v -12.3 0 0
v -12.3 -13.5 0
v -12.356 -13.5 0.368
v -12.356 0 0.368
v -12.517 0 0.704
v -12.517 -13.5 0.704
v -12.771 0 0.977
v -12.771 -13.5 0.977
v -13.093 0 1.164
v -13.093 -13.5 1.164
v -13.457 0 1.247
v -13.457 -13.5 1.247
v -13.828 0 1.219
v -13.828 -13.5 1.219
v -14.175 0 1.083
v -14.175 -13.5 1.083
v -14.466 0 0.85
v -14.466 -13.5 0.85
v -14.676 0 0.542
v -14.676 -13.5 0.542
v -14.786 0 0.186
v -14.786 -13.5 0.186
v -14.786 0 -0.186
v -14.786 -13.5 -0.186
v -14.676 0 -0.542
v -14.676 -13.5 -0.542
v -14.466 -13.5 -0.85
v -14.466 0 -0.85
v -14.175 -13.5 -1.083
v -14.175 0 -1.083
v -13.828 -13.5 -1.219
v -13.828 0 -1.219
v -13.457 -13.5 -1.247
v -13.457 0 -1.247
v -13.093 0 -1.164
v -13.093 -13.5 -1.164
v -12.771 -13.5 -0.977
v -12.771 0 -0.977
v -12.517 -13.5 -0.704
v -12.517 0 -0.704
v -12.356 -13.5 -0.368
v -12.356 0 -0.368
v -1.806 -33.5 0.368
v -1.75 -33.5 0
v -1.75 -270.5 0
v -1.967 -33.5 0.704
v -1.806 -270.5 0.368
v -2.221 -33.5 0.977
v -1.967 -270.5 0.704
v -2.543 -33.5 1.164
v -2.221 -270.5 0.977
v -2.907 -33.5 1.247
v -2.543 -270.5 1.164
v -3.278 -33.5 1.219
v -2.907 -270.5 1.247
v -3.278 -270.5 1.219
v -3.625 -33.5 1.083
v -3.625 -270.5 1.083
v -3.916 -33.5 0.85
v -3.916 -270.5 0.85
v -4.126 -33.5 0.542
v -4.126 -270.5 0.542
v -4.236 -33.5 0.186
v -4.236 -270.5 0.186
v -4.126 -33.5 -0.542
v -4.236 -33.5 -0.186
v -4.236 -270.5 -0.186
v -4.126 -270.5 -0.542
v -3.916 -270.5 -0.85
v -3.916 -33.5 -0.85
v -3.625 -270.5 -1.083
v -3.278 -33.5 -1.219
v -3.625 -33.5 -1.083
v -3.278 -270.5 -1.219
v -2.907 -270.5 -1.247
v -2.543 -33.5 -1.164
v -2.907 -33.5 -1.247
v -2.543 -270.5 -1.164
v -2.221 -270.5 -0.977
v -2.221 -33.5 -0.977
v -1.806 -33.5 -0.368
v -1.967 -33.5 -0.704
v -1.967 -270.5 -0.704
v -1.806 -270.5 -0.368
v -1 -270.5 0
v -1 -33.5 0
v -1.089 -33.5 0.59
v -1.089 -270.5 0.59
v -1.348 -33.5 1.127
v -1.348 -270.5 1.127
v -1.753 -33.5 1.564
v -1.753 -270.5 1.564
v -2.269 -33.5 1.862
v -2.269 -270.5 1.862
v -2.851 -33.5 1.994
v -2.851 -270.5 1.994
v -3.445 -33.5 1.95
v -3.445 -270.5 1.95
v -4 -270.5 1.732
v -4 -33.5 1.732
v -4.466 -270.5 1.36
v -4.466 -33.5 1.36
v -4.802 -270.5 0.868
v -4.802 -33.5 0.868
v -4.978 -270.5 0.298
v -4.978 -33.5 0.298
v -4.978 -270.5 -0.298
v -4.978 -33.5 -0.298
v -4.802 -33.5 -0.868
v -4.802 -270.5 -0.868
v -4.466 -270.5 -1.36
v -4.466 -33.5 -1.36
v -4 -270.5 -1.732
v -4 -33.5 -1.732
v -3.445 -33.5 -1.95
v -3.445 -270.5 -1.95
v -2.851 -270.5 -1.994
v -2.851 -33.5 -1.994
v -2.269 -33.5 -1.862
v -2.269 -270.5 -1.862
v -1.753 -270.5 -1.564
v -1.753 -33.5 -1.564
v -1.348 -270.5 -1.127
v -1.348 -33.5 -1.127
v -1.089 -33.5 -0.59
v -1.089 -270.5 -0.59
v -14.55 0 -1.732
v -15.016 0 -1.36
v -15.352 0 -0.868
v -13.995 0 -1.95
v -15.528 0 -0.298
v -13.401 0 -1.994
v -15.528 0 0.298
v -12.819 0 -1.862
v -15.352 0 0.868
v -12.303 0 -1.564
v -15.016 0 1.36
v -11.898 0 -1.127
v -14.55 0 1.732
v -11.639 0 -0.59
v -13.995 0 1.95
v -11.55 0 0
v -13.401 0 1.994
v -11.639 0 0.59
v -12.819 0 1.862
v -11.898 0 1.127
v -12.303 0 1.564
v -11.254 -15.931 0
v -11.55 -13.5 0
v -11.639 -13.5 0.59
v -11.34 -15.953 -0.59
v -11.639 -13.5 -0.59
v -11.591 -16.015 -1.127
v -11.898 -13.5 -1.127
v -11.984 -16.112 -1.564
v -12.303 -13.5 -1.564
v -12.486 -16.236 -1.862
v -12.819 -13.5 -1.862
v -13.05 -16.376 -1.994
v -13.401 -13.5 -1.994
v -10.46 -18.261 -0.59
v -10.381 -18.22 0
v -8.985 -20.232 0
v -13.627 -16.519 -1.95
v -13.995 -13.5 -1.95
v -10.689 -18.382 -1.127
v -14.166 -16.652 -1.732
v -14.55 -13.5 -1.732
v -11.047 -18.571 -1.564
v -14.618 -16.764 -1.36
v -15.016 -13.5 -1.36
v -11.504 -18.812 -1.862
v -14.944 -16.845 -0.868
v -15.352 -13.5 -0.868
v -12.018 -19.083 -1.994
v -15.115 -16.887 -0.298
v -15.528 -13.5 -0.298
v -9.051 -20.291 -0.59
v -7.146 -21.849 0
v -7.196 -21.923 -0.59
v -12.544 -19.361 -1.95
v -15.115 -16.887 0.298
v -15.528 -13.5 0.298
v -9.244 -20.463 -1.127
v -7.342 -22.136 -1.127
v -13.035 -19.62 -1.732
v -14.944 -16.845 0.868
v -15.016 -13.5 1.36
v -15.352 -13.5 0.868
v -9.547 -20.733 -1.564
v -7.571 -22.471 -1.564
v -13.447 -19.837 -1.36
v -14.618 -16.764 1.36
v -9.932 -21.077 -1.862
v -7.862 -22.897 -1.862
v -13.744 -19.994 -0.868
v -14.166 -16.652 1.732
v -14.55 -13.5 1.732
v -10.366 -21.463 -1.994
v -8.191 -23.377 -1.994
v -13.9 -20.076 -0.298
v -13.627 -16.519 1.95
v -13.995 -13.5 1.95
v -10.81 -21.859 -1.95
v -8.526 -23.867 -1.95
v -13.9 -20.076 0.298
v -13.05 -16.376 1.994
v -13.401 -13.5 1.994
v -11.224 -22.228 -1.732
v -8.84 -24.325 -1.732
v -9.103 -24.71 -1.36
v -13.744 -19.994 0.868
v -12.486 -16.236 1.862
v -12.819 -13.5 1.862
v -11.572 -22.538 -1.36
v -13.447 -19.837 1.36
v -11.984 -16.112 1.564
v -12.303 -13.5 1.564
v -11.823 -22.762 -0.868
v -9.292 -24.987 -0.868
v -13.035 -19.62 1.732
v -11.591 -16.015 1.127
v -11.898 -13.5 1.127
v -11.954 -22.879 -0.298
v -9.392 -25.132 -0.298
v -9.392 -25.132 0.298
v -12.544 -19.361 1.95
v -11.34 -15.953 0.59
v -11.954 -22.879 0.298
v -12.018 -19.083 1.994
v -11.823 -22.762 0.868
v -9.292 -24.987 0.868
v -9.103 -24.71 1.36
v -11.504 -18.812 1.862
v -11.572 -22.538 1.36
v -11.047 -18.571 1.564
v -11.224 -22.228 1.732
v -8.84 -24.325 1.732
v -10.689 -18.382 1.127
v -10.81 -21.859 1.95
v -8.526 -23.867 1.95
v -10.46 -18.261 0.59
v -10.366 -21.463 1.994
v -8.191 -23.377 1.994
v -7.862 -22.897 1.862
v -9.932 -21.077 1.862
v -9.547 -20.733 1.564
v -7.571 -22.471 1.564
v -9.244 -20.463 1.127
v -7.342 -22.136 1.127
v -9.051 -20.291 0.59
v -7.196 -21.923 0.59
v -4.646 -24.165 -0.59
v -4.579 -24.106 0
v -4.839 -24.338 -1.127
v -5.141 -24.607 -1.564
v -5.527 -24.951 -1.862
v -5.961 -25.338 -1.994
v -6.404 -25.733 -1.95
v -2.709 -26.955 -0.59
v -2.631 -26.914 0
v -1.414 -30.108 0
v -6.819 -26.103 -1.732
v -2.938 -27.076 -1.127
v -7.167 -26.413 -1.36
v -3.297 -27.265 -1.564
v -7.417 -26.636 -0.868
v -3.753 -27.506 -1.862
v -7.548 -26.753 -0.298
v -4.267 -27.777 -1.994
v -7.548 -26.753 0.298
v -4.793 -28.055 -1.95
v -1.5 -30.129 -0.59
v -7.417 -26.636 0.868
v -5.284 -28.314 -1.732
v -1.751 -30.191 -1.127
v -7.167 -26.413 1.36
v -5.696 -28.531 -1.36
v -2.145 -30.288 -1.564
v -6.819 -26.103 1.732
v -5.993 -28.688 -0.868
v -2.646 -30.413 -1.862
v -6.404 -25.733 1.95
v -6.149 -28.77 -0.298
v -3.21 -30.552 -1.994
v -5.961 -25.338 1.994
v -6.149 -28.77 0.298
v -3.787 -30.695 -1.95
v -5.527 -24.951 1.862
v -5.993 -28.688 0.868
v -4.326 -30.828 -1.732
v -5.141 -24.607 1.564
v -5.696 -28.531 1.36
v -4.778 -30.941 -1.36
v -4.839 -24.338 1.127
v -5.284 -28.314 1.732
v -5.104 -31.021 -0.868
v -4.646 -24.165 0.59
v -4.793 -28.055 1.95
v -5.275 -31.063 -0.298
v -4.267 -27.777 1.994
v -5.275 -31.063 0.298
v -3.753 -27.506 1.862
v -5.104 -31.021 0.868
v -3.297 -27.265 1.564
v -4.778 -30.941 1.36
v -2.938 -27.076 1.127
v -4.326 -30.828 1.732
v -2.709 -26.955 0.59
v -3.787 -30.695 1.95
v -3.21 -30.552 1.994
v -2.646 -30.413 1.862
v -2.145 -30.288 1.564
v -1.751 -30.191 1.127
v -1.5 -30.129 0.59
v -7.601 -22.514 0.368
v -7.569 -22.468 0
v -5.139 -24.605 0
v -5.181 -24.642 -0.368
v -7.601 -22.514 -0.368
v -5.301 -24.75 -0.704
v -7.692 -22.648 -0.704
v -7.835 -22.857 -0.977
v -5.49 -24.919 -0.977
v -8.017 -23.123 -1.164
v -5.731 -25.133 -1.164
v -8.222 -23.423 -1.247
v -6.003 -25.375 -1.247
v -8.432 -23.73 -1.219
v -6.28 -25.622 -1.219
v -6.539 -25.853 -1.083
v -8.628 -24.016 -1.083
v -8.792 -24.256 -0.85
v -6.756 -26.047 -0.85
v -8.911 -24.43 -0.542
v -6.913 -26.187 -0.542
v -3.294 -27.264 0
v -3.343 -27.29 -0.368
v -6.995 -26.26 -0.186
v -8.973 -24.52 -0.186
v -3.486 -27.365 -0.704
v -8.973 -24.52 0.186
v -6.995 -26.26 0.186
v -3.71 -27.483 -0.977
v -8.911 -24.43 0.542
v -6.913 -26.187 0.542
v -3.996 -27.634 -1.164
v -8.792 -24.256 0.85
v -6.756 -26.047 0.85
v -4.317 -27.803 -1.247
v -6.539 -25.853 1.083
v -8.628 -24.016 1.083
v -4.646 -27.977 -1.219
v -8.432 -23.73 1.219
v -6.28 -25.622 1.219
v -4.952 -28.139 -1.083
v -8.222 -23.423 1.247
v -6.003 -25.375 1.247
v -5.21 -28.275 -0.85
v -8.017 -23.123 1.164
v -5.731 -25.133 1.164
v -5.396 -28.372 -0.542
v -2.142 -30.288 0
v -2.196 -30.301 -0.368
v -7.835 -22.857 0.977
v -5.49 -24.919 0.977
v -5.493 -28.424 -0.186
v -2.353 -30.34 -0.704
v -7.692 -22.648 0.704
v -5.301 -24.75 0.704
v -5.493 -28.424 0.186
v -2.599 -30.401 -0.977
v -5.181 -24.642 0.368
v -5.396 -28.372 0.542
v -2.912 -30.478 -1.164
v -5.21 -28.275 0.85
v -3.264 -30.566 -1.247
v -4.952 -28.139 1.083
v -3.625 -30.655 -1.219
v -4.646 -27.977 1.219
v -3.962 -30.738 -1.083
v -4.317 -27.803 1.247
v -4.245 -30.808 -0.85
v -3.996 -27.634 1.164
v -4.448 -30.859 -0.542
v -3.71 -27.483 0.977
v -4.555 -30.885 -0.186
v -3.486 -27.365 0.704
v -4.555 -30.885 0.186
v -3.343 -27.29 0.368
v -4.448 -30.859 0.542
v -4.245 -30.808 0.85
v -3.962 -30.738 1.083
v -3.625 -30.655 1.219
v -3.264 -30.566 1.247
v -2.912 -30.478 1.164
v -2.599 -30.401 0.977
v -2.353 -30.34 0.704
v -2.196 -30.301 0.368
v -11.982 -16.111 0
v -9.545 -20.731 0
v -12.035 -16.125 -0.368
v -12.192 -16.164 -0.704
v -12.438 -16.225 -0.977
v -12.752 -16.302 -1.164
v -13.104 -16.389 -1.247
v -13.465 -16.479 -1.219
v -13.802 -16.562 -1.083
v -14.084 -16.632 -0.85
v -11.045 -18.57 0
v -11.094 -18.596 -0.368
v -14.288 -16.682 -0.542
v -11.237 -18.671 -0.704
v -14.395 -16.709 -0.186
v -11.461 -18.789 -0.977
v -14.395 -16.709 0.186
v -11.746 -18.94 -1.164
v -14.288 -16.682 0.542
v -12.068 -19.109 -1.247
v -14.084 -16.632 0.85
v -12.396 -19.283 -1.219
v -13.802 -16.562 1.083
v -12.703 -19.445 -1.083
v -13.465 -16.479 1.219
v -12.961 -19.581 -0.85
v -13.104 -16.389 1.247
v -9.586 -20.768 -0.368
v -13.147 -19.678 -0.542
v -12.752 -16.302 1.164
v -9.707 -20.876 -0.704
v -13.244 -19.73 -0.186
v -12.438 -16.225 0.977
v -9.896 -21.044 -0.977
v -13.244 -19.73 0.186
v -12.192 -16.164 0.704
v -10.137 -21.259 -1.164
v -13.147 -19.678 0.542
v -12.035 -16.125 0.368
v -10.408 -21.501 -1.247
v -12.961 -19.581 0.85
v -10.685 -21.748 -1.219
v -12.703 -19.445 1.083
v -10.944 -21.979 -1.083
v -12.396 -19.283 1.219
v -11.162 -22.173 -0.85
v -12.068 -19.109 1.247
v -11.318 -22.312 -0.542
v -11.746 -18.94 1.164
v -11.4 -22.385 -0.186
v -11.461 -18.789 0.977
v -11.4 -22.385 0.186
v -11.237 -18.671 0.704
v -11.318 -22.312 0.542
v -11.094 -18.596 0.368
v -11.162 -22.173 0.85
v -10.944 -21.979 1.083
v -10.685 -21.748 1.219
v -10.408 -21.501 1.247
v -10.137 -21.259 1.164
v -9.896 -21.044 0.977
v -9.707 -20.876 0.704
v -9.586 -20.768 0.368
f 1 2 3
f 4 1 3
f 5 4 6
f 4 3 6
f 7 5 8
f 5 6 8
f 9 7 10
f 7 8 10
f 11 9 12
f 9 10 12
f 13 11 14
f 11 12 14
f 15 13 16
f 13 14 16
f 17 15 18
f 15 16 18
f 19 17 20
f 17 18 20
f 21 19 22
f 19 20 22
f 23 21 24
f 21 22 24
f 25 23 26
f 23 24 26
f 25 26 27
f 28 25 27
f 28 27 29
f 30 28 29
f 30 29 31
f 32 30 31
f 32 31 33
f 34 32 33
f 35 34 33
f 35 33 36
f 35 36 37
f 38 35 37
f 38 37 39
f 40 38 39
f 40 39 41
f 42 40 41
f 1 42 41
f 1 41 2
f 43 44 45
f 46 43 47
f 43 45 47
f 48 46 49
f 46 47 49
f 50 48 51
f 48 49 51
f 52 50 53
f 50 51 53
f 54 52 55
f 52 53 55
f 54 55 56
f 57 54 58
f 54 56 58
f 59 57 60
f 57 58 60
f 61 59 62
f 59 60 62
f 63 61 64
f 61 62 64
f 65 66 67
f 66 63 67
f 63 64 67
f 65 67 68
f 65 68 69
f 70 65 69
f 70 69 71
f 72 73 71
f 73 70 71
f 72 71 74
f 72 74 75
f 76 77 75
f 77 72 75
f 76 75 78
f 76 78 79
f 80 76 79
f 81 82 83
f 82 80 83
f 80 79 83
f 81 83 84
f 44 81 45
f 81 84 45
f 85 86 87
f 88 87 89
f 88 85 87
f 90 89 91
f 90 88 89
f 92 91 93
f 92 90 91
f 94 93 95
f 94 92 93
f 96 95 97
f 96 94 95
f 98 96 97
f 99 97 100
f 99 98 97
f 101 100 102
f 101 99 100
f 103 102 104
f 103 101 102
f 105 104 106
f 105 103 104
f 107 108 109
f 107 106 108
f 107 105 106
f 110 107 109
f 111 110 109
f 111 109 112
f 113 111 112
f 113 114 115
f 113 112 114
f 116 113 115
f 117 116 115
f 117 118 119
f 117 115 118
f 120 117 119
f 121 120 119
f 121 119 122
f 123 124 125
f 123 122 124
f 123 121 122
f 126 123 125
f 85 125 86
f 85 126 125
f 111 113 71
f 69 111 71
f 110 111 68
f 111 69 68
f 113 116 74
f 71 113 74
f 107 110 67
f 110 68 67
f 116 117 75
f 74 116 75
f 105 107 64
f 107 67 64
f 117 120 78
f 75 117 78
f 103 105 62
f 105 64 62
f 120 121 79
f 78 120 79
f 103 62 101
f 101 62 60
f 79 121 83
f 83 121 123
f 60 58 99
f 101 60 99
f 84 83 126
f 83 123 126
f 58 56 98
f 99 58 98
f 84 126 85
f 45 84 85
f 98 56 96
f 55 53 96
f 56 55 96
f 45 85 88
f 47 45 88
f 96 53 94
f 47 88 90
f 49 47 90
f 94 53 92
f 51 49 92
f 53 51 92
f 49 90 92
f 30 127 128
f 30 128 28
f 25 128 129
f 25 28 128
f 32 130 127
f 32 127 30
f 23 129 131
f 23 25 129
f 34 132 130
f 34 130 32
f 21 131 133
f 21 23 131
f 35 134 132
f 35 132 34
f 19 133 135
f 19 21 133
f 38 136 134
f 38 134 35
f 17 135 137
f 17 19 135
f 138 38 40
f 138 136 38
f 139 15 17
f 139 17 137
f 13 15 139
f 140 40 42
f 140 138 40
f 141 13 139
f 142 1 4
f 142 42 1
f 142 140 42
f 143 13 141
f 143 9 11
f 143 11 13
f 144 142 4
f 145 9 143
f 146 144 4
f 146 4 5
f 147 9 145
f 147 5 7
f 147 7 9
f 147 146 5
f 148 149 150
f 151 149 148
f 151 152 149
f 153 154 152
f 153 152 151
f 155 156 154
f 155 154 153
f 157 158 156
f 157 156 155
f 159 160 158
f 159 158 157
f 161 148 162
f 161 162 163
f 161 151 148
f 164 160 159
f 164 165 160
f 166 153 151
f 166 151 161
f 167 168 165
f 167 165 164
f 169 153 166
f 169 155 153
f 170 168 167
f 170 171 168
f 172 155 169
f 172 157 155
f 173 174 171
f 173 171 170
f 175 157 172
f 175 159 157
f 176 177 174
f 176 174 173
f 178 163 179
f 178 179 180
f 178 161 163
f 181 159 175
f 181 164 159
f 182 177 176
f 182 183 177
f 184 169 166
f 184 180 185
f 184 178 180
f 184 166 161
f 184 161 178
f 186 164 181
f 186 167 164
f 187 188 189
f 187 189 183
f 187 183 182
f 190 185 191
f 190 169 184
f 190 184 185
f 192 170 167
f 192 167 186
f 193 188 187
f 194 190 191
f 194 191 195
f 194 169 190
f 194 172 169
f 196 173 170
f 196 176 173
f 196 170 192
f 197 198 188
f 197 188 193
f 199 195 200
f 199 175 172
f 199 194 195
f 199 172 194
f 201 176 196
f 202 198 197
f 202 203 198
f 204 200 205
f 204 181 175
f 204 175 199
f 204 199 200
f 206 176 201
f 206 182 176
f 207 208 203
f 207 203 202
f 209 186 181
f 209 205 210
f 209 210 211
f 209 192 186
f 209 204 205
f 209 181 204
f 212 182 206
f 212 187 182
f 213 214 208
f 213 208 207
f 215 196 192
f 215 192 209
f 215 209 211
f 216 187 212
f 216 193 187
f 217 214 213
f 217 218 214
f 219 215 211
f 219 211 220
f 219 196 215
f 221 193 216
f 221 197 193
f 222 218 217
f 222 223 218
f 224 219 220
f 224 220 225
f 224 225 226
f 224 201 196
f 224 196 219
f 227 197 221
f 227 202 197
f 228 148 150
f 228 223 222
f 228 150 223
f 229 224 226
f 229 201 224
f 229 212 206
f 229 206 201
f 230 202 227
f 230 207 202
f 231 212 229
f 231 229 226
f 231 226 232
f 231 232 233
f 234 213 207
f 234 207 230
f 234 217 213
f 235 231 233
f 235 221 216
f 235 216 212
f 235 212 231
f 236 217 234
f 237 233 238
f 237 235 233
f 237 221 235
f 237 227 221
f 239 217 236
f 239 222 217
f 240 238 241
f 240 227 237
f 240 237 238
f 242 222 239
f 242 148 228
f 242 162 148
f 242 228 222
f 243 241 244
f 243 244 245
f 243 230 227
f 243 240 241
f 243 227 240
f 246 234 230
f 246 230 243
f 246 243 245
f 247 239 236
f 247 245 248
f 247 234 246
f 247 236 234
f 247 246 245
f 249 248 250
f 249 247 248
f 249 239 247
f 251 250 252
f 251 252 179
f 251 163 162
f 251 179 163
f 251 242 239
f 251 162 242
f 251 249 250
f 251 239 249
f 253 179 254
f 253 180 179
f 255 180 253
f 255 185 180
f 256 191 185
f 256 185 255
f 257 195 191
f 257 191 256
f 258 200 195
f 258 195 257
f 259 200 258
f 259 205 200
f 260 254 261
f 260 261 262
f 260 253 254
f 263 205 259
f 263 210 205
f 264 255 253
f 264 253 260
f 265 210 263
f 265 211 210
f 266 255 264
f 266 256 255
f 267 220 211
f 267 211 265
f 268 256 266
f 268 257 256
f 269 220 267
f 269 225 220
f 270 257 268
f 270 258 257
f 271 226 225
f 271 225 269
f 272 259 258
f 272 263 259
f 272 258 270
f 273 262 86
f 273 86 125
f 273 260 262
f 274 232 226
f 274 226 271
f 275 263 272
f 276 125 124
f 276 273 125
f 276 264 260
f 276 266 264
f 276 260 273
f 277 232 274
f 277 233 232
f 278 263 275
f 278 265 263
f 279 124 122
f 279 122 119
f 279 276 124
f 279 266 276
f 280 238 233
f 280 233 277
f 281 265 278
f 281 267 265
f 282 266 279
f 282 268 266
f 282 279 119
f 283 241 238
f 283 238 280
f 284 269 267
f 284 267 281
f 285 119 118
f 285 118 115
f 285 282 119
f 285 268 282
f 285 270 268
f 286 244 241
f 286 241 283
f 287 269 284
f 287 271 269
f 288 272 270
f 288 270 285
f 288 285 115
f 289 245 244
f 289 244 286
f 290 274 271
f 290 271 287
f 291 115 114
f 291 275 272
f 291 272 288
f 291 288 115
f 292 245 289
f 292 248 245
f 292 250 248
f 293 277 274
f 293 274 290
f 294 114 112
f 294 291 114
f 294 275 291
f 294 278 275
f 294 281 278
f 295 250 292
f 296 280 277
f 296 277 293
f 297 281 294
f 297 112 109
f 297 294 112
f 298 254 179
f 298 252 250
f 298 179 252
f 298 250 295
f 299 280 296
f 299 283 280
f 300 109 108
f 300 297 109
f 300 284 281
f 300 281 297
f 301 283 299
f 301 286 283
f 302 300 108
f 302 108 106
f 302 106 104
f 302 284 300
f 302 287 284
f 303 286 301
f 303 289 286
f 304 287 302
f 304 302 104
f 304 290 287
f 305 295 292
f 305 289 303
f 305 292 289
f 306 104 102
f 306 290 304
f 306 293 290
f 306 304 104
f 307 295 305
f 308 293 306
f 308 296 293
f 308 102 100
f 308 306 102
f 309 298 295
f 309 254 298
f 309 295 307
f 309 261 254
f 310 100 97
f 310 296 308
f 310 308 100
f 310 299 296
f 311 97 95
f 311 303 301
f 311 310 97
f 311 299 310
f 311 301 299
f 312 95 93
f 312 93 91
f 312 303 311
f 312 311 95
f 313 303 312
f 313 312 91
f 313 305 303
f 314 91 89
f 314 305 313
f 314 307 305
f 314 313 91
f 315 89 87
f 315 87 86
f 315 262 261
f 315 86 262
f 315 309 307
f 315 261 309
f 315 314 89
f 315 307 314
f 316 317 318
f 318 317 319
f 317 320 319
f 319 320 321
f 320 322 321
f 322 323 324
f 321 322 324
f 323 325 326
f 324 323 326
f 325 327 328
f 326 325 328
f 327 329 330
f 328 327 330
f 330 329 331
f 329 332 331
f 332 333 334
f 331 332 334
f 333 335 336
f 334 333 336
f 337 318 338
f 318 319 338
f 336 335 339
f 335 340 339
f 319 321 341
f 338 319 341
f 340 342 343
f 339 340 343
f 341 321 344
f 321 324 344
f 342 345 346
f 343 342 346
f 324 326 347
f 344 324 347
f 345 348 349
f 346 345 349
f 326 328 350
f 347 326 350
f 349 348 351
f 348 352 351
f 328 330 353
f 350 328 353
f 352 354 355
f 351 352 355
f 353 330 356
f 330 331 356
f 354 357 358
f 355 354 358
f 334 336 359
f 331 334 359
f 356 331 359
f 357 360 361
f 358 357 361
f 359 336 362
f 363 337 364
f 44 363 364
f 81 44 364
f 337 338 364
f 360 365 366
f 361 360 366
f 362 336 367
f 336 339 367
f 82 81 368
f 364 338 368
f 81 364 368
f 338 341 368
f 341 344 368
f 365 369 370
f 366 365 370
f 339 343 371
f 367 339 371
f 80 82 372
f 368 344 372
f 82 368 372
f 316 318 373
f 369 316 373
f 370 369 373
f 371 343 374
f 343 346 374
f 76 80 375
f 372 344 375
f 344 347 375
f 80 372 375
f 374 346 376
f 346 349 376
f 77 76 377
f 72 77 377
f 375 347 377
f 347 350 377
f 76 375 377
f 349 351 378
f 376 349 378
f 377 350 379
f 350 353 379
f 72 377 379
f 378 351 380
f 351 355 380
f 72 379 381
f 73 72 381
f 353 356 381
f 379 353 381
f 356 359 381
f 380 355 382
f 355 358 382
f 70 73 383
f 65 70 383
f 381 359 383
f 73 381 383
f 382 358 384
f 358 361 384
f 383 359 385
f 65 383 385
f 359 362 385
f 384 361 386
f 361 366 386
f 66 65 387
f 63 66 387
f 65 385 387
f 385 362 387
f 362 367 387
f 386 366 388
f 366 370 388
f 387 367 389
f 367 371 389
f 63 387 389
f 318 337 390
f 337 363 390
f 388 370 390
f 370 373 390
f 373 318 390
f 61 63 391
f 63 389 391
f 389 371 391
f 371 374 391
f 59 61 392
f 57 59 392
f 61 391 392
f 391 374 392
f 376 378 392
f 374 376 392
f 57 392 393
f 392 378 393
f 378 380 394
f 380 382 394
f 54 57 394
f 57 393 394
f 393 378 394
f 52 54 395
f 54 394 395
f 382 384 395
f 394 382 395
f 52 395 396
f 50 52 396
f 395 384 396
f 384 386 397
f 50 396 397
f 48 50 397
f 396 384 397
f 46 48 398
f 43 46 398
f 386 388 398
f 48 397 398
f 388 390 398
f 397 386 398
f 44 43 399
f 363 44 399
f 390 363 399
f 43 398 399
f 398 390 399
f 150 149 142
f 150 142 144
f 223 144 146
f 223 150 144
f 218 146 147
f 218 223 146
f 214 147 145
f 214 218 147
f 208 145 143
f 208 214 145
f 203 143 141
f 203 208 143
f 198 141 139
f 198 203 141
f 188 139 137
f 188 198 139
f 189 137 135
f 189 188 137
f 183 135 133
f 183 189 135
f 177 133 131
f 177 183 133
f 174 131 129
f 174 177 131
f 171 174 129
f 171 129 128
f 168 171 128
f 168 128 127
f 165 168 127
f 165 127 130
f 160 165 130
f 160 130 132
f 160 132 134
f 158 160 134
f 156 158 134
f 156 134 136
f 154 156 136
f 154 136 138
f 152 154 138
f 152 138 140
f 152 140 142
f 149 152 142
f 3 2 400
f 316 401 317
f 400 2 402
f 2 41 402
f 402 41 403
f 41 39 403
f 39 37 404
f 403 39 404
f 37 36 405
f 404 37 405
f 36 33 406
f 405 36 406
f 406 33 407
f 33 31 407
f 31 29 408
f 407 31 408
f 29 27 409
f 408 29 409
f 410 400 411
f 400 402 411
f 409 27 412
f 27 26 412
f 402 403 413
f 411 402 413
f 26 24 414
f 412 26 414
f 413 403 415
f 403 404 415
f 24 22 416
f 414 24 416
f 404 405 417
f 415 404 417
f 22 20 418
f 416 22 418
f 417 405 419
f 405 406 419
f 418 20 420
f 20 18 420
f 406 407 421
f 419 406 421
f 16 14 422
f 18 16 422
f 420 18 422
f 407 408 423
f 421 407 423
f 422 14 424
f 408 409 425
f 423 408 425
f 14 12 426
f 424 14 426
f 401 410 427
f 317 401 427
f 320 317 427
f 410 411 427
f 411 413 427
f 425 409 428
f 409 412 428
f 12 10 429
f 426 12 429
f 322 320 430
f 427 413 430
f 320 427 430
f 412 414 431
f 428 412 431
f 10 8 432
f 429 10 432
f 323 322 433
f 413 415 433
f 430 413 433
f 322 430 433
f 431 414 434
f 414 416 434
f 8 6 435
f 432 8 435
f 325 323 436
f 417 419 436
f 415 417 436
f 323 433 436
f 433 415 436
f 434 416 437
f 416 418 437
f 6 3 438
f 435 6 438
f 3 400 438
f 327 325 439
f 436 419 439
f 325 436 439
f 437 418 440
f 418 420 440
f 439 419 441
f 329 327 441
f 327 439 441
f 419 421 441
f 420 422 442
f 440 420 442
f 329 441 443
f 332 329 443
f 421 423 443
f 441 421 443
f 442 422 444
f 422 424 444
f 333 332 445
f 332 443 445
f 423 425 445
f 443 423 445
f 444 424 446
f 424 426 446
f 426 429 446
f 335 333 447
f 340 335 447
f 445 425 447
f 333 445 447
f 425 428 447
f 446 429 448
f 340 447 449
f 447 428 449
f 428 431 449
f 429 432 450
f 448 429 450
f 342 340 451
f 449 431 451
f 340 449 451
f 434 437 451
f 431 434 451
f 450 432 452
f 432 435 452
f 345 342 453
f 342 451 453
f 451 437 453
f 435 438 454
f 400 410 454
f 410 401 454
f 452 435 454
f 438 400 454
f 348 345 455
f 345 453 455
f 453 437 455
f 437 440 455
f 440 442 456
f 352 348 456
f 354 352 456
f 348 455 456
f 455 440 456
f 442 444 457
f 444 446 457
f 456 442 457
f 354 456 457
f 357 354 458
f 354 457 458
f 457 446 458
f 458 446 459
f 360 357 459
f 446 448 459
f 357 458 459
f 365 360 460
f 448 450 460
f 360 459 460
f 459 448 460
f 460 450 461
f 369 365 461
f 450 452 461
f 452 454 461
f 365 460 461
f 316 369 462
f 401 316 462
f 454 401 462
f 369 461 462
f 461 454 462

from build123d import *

# Parameters (mm, degrees)
UTILITY_CIRCULAR_CROSS_SECTION_R   = 2
UTILITY_CIRCULAR_CROSS_SECTION_R_2 = 1.25


with BuildPart() as part:
    # Native hollow utility sweep: sweep along a path in Illustrative smooth utility route
    with BuildLine(Plane.XY) as native_hollow_utility_sweep_path:
        Line((-13.55, 0), (-13.55, -13.5))
        ThreePointArc((-13.55, -13.5), (-12.150414231, -19.152999757), (-8.275, -23.5))
        ThreePointArc((-8.275, -23.5), (-4.399585769, -27.847000243), (-3, -33.5))
        Line((-3, -33.5), (-3, -270.5))
    # Utility circular cross section → Native hollow utility sweep (sweep)
    with BuildSketch(Plane(origin=(0, 0, 0), x_dir=(1, 0, 0), z_dir=(0, 1, 0))):
        with Locations((-13.55, 0)):
            Circle(UTILITY_CIRCULAR_CROSS_SECTION_R)
        with Locations((-13.55, 0)):
            Circle(UTILITY_CIRCULAR_CROSS_SECTION_R_2, mode=Mode.SUBTRACT)
    sweep(path=native_hollow_utility_sweep_path.line)


solid = part.part
